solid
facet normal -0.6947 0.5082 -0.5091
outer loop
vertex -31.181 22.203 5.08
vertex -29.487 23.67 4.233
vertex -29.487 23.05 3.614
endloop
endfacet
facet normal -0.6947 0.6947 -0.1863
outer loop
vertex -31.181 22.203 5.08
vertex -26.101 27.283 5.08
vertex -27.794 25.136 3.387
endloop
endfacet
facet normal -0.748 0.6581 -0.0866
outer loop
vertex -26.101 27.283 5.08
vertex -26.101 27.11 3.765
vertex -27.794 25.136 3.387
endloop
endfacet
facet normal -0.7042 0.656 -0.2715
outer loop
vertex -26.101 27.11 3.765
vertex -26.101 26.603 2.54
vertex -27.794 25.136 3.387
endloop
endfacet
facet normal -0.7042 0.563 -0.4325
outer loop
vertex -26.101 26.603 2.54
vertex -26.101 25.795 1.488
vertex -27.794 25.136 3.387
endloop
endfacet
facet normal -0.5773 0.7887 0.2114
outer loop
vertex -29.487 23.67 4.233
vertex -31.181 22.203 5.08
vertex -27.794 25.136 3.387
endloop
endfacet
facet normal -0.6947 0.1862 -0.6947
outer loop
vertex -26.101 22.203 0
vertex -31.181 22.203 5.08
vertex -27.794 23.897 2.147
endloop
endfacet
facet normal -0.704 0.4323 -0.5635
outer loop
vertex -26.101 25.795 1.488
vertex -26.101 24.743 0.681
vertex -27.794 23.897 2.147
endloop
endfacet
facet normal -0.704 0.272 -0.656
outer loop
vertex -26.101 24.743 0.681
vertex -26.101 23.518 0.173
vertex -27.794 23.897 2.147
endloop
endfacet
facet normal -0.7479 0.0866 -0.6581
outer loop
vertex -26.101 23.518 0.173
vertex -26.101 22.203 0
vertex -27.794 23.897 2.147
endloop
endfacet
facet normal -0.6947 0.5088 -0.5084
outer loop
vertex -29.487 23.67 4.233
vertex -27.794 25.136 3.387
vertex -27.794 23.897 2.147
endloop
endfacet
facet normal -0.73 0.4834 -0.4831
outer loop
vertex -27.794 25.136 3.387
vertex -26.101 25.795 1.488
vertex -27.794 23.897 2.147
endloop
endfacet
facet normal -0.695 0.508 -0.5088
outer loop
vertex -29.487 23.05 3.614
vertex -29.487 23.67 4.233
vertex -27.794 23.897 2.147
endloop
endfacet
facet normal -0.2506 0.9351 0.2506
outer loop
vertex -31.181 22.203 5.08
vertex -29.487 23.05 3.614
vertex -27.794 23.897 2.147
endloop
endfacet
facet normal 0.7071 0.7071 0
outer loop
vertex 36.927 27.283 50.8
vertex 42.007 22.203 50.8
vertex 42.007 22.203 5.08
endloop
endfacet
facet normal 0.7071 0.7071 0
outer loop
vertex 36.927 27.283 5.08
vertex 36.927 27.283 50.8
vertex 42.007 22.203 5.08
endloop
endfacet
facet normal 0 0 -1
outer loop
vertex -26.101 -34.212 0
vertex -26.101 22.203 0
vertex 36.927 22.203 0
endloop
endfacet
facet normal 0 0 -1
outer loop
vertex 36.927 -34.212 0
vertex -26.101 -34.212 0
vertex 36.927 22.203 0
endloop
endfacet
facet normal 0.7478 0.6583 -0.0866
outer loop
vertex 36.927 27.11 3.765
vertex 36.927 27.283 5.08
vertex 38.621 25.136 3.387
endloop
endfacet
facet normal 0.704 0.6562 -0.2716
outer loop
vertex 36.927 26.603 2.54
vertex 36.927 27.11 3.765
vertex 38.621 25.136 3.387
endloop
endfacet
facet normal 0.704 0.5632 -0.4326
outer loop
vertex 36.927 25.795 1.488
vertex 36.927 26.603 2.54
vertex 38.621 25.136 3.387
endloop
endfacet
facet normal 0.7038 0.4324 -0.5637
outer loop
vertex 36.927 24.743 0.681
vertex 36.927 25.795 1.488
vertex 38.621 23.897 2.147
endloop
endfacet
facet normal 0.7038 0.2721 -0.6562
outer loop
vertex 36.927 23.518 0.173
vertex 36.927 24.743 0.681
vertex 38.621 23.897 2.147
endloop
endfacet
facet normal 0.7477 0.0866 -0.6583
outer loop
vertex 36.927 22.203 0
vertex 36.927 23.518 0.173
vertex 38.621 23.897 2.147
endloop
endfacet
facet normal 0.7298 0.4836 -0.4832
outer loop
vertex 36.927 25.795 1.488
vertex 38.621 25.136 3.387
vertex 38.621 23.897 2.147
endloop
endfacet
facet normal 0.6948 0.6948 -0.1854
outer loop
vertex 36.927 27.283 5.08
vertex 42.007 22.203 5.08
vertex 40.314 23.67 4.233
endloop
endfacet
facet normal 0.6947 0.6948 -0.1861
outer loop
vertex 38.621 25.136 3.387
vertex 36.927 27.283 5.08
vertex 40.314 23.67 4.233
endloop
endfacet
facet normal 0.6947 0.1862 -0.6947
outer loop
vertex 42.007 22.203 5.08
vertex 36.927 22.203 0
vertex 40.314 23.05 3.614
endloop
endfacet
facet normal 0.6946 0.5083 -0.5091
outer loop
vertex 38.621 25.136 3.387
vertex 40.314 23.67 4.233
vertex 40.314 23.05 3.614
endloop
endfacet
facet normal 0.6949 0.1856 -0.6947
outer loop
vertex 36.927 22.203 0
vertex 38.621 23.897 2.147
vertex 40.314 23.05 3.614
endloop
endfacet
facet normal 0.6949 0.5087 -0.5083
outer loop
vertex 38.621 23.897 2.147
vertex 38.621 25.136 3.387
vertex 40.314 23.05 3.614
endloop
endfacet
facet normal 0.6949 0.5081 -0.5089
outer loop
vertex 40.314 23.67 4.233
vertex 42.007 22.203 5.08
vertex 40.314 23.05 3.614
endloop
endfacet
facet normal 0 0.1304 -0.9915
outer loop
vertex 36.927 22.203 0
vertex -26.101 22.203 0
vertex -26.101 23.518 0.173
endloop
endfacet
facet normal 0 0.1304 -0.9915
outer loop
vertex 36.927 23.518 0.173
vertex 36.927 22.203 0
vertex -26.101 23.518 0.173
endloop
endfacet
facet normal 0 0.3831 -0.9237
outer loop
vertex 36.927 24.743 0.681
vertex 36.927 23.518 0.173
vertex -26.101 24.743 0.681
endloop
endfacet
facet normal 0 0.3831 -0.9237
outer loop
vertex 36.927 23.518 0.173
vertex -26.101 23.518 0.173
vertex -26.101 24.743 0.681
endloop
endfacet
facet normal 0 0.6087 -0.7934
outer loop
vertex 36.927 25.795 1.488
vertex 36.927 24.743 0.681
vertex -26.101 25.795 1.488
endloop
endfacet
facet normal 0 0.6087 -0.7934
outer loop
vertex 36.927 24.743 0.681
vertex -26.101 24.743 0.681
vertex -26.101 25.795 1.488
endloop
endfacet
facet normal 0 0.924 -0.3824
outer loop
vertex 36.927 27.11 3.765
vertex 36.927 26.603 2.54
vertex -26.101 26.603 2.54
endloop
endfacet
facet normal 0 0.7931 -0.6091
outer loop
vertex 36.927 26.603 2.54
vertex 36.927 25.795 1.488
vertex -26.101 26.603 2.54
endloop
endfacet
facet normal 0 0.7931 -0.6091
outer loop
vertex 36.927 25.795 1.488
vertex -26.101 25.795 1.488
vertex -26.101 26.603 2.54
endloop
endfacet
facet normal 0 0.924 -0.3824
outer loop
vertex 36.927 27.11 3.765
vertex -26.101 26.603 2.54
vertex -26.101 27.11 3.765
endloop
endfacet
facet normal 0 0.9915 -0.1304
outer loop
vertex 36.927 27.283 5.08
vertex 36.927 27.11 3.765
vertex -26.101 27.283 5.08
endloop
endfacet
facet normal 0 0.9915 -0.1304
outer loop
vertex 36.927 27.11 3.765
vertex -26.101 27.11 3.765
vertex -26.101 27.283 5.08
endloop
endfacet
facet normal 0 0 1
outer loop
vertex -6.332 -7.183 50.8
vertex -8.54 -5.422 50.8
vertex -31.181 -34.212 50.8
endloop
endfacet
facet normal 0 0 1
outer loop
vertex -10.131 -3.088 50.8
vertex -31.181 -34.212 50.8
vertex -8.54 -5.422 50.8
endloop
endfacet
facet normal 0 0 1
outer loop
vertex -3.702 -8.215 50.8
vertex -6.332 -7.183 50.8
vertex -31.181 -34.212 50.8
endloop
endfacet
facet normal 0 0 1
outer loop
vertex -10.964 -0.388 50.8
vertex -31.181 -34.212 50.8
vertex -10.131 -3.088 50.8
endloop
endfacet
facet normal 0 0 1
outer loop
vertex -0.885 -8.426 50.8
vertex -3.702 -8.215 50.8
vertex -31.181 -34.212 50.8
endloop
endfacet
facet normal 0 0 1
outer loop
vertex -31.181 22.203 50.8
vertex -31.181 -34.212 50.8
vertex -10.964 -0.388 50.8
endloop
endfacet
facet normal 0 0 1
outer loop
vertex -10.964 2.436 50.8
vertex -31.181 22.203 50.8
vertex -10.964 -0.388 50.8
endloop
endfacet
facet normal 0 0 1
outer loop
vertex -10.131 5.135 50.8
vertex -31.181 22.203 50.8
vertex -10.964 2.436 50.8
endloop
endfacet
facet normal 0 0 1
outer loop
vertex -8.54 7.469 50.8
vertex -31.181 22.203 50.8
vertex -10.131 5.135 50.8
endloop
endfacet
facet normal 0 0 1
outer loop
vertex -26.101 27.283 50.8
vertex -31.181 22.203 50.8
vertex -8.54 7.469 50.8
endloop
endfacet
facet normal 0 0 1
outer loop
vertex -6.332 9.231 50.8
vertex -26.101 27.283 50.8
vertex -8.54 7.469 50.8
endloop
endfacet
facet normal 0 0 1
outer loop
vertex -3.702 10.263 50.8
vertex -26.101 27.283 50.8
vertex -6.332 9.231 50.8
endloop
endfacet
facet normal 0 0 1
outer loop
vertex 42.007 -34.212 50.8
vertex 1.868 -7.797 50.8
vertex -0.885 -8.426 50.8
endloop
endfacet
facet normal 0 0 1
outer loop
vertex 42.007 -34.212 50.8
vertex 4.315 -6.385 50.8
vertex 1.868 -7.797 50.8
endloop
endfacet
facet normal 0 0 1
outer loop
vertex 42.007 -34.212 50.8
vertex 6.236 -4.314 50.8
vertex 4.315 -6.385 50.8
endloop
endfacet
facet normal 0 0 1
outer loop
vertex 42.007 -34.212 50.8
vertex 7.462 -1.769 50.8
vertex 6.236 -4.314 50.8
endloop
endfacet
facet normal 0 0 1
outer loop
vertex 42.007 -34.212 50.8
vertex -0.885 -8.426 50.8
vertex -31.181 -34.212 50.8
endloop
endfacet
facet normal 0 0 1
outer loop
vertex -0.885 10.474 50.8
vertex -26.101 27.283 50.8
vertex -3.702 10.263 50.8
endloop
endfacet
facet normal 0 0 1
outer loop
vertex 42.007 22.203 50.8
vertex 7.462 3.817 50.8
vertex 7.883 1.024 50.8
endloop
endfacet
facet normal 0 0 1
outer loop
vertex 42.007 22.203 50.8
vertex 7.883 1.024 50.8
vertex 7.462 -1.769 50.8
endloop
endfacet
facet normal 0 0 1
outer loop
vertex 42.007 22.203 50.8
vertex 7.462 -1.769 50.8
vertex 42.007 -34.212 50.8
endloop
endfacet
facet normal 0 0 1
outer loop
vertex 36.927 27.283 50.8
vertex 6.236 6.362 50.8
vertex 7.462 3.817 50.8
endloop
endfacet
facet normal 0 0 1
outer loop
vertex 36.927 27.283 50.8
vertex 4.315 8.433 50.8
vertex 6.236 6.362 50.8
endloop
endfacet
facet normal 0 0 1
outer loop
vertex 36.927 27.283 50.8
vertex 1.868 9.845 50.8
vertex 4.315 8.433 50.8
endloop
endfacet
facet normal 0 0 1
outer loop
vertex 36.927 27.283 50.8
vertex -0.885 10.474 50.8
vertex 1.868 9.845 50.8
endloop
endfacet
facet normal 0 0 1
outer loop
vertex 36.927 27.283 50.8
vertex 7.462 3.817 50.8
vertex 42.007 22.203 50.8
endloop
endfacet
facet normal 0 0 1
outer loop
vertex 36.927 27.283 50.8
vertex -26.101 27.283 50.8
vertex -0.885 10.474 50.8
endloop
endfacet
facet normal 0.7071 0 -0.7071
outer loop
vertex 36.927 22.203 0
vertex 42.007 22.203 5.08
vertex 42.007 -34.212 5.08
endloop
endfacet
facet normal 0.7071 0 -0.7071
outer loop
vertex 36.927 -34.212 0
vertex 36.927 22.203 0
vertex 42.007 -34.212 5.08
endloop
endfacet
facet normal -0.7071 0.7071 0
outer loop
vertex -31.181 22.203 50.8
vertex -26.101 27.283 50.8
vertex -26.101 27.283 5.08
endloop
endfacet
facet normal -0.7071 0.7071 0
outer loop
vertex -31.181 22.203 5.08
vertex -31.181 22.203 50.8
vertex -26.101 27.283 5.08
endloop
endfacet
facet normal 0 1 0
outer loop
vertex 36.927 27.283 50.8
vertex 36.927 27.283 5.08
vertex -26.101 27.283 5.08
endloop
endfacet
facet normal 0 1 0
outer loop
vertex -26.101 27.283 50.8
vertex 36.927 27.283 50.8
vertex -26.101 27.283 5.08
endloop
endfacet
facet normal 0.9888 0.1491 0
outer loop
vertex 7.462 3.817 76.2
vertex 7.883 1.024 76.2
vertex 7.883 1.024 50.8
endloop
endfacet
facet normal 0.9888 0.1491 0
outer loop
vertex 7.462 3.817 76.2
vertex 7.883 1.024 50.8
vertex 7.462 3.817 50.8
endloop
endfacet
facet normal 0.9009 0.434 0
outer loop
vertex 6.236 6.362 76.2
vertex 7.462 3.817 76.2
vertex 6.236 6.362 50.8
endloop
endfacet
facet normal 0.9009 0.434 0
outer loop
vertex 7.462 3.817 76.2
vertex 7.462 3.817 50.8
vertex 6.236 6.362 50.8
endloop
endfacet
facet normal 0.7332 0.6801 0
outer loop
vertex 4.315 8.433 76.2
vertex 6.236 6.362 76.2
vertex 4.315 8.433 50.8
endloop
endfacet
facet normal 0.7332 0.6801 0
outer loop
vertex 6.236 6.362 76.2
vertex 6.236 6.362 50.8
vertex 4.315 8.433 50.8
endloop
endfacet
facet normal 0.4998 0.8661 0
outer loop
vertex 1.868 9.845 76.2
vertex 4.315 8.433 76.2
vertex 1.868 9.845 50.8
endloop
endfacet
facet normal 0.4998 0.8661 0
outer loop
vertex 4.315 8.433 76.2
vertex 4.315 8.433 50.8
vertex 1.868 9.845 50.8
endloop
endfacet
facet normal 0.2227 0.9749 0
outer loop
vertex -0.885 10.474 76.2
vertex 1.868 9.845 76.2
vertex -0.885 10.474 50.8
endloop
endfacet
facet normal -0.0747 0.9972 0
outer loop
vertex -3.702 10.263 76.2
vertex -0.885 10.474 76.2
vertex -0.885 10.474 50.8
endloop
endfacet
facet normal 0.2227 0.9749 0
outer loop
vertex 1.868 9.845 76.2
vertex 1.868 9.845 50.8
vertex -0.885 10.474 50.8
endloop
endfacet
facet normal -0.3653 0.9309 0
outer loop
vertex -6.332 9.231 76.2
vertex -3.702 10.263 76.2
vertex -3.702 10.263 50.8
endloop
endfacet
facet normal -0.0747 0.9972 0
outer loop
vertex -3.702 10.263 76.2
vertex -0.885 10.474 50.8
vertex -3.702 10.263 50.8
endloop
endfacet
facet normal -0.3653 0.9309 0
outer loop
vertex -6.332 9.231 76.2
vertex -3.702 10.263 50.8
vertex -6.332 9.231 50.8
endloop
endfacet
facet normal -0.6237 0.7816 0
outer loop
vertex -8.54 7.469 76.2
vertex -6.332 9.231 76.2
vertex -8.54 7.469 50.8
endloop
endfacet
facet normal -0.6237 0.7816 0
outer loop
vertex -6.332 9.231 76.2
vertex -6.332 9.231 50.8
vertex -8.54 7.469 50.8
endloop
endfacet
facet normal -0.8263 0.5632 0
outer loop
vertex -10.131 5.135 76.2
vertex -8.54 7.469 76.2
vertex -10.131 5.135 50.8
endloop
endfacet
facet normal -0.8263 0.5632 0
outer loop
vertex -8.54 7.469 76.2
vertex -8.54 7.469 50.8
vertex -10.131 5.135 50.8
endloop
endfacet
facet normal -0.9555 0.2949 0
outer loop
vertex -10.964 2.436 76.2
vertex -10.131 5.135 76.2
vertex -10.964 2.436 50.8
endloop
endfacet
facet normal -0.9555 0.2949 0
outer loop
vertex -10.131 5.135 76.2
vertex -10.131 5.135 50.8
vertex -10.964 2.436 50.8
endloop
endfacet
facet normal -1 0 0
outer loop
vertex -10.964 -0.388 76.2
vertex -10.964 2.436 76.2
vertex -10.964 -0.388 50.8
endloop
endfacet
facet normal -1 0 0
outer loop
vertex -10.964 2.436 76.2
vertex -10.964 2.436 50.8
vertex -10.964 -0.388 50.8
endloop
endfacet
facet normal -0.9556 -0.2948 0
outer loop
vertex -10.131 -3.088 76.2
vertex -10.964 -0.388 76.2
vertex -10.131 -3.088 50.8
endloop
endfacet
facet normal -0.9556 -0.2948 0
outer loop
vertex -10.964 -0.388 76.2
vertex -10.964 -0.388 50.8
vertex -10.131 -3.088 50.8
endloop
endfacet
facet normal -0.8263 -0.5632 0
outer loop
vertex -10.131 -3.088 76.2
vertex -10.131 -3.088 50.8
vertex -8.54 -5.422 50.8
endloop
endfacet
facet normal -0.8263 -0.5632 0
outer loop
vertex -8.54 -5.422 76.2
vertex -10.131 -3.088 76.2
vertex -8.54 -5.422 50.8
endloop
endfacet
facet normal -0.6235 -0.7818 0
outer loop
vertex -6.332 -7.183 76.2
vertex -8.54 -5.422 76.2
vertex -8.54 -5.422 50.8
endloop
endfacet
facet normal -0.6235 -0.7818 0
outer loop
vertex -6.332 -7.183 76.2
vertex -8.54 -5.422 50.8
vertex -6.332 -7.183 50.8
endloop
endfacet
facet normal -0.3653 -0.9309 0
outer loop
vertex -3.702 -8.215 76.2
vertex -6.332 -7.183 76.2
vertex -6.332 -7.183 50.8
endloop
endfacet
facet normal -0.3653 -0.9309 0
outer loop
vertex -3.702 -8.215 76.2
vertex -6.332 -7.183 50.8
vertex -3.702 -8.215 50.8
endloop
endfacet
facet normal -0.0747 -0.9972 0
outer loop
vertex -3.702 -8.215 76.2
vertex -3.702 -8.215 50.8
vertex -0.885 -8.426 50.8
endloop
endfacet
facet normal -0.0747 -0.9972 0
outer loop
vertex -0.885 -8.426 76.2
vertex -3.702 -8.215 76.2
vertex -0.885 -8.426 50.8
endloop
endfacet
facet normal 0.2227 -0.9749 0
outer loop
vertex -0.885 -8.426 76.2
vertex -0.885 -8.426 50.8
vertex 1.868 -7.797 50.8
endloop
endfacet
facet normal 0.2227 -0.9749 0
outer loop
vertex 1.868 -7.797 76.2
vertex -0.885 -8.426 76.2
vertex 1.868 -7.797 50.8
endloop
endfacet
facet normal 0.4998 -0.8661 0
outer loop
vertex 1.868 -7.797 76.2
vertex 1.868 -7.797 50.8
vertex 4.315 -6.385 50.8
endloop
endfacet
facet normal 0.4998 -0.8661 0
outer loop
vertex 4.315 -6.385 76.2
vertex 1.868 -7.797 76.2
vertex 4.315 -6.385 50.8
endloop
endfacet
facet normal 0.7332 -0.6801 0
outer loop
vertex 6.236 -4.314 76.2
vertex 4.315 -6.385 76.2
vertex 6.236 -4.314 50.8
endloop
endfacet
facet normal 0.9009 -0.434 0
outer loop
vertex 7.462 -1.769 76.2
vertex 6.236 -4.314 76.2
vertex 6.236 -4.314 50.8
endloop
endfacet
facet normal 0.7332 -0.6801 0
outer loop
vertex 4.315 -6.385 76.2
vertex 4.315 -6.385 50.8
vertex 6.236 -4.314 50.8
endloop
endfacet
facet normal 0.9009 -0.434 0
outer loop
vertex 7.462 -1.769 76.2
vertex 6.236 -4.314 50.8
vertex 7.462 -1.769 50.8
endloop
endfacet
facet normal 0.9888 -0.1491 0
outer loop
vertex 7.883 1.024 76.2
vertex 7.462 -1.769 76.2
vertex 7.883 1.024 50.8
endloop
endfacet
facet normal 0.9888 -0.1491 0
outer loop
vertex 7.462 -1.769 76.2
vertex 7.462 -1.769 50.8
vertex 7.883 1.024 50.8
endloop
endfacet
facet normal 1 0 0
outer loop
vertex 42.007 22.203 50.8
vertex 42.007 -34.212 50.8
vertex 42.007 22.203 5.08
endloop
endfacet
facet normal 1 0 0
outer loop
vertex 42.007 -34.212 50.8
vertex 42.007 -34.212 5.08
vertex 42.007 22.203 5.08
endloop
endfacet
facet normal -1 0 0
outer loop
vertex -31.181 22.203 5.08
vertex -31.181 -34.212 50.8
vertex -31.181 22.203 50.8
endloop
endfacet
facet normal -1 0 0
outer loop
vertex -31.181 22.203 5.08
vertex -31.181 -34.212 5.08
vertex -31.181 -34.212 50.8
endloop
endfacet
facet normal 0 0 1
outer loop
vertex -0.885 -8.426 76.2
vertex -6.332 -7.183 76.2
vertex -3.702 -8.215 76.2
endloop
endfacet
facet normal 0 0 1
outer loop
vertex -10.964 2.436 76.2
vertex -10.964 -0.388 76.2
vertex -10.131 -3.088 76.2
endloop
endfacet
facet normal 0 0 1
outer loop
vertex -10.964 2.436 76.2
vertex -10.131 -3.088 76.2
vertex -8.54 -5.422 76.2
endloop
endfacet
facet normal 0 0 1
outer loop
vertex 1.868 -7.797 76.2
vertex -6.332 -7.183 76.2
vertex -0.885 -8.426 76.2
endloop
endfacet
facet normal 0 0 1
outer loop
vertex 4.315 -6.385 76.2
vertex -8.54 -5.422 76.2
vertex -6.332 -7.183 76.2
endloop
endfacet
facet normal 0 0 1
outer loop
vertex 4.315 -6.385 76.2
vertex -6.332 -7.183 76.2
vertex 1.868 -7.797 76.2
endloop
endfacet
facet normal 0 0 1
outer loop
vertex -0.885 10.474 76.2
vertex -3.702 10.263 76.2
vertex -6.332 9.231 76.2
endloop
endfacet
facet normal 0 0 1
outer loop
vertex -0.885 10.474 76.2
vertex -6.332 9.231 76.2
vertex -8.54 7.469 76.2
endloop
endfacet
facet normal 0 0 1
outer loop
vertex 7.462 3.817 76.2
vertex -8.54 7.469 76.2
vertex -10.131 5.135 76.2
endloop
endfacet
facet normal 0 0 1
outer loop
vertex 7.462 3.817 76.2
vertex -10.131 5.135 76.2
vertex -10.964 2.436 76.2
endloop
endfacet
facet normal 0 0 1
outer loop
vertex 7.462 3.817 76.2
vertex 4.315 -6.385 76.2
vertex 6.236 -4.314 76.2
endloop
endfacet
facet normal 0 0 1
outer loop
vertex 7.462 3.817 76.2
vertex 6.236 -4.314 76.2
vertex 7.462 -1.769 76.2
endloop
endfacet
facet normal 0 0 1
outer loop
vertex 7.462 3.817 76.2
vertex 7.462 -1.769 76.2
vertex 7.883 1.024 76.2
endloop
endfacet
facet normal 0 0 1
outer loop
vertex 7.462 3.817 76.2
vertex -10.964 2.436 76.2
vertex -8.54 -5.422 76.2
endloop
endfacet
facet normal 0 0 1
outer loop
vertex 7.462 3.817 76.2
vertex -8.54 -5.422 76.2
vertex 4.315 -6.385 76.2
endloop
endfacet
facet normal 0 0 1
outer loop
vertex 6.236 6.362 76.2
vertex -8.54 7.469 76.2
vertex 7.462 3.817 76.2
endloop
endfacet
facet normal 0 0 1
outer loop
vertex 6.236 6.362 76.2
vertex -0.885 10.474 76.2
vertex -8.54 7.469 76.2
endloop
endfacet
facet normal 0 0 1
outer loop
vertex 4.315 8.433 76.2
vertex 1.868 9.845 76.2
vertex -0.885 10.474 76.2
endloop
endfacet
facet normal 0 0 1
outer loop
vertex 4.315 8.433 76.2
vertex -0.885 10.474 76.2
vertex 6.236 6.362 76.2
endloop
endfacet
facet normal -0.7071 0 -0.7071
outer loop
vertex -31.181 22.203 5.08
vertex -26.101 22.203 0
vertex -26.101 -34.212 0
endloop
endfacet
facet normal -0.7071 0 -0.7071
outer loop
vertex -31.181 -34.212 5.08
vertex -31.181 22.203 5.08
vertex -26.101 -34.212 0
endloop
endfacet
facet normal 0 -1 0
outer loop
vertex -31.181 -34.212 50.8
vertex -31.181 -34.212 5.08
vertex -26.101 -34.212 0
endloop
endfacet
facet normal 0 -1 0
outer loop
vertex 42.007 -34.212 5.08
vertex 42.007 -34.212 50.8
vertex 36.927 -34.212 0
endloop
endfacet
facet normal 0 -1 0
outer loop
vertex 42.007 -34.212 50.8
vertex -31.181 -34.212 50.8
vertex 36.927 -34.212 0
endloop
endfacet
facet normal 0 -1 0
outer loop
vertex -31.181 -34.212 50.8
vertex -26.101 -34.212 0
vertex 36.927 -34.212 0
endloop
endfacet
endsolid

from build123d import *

# Parameters (mm, degrees)
F0_W     = 36.594145
F0_H     = 61.4954829216
F1_DEPTH = 25.4
F2_DEPTH = 25.4
F3_R     = 5.08
F4_SIZE  = 5.07999
F5_R     = 9.4762574088
F6_DEPTH = 25.4


# Not quite as in the source:
# - a fillet or chamfer is up to 0.001 mm smaller than in the source, because OpenCascade refuses the exact size


with BuildPart() as f1:
    # F0 (on Top) → F1 (new body)
    with BuildSketch(Plane.XY):
        with Locations((-12.8837414086, -3.4645497799)):
            Rectangle(F0_W, F0_H)
        with Locations((23.7104035914, -3.4645497799)):
            Rectangle(F0_W, F0_H)
    extrude(amount=F1_DEPTH)

    # F2 (add): a face of the model
    f2_faces = [f1.faces().sort_by_distance(p)[0] for p in [
        (5.4133310914, -3.4645497799, 25.4),
    ]]
    extrude(f2_faces, amount=F2_DEPTH)

    # F3
    f3_edges = [f1.edges().sort_by_distance(p)[0] for p in [
        (5.413331, 27.283192, 0),
    ]]
    fillet(f3_edges, radius=F3_R)

    # F4 (size 5.08 in the source; OpenCascade refuses exactly that, so slightly less here)
    f4_edges = [f1.edges().sort_by_distance(p)[0] for p in [
        (-31.180814, 27.283192, 27.94),
        (42.007476, 27.283192, 27.94),
        (42.007476, -6.00455, 0),
    ]]
    chamfer(f4_edges, length=F4_SIZE)

    # F5 (on face) → F6 (join)
    with BuildSketch(Plane.XY.offset(50.8)):
        with Locations((-1.593567431, 1.0238895973)):
            Circle(F5_R)
    extrude(amount=F6_DEPTH)


solid = f1.part
